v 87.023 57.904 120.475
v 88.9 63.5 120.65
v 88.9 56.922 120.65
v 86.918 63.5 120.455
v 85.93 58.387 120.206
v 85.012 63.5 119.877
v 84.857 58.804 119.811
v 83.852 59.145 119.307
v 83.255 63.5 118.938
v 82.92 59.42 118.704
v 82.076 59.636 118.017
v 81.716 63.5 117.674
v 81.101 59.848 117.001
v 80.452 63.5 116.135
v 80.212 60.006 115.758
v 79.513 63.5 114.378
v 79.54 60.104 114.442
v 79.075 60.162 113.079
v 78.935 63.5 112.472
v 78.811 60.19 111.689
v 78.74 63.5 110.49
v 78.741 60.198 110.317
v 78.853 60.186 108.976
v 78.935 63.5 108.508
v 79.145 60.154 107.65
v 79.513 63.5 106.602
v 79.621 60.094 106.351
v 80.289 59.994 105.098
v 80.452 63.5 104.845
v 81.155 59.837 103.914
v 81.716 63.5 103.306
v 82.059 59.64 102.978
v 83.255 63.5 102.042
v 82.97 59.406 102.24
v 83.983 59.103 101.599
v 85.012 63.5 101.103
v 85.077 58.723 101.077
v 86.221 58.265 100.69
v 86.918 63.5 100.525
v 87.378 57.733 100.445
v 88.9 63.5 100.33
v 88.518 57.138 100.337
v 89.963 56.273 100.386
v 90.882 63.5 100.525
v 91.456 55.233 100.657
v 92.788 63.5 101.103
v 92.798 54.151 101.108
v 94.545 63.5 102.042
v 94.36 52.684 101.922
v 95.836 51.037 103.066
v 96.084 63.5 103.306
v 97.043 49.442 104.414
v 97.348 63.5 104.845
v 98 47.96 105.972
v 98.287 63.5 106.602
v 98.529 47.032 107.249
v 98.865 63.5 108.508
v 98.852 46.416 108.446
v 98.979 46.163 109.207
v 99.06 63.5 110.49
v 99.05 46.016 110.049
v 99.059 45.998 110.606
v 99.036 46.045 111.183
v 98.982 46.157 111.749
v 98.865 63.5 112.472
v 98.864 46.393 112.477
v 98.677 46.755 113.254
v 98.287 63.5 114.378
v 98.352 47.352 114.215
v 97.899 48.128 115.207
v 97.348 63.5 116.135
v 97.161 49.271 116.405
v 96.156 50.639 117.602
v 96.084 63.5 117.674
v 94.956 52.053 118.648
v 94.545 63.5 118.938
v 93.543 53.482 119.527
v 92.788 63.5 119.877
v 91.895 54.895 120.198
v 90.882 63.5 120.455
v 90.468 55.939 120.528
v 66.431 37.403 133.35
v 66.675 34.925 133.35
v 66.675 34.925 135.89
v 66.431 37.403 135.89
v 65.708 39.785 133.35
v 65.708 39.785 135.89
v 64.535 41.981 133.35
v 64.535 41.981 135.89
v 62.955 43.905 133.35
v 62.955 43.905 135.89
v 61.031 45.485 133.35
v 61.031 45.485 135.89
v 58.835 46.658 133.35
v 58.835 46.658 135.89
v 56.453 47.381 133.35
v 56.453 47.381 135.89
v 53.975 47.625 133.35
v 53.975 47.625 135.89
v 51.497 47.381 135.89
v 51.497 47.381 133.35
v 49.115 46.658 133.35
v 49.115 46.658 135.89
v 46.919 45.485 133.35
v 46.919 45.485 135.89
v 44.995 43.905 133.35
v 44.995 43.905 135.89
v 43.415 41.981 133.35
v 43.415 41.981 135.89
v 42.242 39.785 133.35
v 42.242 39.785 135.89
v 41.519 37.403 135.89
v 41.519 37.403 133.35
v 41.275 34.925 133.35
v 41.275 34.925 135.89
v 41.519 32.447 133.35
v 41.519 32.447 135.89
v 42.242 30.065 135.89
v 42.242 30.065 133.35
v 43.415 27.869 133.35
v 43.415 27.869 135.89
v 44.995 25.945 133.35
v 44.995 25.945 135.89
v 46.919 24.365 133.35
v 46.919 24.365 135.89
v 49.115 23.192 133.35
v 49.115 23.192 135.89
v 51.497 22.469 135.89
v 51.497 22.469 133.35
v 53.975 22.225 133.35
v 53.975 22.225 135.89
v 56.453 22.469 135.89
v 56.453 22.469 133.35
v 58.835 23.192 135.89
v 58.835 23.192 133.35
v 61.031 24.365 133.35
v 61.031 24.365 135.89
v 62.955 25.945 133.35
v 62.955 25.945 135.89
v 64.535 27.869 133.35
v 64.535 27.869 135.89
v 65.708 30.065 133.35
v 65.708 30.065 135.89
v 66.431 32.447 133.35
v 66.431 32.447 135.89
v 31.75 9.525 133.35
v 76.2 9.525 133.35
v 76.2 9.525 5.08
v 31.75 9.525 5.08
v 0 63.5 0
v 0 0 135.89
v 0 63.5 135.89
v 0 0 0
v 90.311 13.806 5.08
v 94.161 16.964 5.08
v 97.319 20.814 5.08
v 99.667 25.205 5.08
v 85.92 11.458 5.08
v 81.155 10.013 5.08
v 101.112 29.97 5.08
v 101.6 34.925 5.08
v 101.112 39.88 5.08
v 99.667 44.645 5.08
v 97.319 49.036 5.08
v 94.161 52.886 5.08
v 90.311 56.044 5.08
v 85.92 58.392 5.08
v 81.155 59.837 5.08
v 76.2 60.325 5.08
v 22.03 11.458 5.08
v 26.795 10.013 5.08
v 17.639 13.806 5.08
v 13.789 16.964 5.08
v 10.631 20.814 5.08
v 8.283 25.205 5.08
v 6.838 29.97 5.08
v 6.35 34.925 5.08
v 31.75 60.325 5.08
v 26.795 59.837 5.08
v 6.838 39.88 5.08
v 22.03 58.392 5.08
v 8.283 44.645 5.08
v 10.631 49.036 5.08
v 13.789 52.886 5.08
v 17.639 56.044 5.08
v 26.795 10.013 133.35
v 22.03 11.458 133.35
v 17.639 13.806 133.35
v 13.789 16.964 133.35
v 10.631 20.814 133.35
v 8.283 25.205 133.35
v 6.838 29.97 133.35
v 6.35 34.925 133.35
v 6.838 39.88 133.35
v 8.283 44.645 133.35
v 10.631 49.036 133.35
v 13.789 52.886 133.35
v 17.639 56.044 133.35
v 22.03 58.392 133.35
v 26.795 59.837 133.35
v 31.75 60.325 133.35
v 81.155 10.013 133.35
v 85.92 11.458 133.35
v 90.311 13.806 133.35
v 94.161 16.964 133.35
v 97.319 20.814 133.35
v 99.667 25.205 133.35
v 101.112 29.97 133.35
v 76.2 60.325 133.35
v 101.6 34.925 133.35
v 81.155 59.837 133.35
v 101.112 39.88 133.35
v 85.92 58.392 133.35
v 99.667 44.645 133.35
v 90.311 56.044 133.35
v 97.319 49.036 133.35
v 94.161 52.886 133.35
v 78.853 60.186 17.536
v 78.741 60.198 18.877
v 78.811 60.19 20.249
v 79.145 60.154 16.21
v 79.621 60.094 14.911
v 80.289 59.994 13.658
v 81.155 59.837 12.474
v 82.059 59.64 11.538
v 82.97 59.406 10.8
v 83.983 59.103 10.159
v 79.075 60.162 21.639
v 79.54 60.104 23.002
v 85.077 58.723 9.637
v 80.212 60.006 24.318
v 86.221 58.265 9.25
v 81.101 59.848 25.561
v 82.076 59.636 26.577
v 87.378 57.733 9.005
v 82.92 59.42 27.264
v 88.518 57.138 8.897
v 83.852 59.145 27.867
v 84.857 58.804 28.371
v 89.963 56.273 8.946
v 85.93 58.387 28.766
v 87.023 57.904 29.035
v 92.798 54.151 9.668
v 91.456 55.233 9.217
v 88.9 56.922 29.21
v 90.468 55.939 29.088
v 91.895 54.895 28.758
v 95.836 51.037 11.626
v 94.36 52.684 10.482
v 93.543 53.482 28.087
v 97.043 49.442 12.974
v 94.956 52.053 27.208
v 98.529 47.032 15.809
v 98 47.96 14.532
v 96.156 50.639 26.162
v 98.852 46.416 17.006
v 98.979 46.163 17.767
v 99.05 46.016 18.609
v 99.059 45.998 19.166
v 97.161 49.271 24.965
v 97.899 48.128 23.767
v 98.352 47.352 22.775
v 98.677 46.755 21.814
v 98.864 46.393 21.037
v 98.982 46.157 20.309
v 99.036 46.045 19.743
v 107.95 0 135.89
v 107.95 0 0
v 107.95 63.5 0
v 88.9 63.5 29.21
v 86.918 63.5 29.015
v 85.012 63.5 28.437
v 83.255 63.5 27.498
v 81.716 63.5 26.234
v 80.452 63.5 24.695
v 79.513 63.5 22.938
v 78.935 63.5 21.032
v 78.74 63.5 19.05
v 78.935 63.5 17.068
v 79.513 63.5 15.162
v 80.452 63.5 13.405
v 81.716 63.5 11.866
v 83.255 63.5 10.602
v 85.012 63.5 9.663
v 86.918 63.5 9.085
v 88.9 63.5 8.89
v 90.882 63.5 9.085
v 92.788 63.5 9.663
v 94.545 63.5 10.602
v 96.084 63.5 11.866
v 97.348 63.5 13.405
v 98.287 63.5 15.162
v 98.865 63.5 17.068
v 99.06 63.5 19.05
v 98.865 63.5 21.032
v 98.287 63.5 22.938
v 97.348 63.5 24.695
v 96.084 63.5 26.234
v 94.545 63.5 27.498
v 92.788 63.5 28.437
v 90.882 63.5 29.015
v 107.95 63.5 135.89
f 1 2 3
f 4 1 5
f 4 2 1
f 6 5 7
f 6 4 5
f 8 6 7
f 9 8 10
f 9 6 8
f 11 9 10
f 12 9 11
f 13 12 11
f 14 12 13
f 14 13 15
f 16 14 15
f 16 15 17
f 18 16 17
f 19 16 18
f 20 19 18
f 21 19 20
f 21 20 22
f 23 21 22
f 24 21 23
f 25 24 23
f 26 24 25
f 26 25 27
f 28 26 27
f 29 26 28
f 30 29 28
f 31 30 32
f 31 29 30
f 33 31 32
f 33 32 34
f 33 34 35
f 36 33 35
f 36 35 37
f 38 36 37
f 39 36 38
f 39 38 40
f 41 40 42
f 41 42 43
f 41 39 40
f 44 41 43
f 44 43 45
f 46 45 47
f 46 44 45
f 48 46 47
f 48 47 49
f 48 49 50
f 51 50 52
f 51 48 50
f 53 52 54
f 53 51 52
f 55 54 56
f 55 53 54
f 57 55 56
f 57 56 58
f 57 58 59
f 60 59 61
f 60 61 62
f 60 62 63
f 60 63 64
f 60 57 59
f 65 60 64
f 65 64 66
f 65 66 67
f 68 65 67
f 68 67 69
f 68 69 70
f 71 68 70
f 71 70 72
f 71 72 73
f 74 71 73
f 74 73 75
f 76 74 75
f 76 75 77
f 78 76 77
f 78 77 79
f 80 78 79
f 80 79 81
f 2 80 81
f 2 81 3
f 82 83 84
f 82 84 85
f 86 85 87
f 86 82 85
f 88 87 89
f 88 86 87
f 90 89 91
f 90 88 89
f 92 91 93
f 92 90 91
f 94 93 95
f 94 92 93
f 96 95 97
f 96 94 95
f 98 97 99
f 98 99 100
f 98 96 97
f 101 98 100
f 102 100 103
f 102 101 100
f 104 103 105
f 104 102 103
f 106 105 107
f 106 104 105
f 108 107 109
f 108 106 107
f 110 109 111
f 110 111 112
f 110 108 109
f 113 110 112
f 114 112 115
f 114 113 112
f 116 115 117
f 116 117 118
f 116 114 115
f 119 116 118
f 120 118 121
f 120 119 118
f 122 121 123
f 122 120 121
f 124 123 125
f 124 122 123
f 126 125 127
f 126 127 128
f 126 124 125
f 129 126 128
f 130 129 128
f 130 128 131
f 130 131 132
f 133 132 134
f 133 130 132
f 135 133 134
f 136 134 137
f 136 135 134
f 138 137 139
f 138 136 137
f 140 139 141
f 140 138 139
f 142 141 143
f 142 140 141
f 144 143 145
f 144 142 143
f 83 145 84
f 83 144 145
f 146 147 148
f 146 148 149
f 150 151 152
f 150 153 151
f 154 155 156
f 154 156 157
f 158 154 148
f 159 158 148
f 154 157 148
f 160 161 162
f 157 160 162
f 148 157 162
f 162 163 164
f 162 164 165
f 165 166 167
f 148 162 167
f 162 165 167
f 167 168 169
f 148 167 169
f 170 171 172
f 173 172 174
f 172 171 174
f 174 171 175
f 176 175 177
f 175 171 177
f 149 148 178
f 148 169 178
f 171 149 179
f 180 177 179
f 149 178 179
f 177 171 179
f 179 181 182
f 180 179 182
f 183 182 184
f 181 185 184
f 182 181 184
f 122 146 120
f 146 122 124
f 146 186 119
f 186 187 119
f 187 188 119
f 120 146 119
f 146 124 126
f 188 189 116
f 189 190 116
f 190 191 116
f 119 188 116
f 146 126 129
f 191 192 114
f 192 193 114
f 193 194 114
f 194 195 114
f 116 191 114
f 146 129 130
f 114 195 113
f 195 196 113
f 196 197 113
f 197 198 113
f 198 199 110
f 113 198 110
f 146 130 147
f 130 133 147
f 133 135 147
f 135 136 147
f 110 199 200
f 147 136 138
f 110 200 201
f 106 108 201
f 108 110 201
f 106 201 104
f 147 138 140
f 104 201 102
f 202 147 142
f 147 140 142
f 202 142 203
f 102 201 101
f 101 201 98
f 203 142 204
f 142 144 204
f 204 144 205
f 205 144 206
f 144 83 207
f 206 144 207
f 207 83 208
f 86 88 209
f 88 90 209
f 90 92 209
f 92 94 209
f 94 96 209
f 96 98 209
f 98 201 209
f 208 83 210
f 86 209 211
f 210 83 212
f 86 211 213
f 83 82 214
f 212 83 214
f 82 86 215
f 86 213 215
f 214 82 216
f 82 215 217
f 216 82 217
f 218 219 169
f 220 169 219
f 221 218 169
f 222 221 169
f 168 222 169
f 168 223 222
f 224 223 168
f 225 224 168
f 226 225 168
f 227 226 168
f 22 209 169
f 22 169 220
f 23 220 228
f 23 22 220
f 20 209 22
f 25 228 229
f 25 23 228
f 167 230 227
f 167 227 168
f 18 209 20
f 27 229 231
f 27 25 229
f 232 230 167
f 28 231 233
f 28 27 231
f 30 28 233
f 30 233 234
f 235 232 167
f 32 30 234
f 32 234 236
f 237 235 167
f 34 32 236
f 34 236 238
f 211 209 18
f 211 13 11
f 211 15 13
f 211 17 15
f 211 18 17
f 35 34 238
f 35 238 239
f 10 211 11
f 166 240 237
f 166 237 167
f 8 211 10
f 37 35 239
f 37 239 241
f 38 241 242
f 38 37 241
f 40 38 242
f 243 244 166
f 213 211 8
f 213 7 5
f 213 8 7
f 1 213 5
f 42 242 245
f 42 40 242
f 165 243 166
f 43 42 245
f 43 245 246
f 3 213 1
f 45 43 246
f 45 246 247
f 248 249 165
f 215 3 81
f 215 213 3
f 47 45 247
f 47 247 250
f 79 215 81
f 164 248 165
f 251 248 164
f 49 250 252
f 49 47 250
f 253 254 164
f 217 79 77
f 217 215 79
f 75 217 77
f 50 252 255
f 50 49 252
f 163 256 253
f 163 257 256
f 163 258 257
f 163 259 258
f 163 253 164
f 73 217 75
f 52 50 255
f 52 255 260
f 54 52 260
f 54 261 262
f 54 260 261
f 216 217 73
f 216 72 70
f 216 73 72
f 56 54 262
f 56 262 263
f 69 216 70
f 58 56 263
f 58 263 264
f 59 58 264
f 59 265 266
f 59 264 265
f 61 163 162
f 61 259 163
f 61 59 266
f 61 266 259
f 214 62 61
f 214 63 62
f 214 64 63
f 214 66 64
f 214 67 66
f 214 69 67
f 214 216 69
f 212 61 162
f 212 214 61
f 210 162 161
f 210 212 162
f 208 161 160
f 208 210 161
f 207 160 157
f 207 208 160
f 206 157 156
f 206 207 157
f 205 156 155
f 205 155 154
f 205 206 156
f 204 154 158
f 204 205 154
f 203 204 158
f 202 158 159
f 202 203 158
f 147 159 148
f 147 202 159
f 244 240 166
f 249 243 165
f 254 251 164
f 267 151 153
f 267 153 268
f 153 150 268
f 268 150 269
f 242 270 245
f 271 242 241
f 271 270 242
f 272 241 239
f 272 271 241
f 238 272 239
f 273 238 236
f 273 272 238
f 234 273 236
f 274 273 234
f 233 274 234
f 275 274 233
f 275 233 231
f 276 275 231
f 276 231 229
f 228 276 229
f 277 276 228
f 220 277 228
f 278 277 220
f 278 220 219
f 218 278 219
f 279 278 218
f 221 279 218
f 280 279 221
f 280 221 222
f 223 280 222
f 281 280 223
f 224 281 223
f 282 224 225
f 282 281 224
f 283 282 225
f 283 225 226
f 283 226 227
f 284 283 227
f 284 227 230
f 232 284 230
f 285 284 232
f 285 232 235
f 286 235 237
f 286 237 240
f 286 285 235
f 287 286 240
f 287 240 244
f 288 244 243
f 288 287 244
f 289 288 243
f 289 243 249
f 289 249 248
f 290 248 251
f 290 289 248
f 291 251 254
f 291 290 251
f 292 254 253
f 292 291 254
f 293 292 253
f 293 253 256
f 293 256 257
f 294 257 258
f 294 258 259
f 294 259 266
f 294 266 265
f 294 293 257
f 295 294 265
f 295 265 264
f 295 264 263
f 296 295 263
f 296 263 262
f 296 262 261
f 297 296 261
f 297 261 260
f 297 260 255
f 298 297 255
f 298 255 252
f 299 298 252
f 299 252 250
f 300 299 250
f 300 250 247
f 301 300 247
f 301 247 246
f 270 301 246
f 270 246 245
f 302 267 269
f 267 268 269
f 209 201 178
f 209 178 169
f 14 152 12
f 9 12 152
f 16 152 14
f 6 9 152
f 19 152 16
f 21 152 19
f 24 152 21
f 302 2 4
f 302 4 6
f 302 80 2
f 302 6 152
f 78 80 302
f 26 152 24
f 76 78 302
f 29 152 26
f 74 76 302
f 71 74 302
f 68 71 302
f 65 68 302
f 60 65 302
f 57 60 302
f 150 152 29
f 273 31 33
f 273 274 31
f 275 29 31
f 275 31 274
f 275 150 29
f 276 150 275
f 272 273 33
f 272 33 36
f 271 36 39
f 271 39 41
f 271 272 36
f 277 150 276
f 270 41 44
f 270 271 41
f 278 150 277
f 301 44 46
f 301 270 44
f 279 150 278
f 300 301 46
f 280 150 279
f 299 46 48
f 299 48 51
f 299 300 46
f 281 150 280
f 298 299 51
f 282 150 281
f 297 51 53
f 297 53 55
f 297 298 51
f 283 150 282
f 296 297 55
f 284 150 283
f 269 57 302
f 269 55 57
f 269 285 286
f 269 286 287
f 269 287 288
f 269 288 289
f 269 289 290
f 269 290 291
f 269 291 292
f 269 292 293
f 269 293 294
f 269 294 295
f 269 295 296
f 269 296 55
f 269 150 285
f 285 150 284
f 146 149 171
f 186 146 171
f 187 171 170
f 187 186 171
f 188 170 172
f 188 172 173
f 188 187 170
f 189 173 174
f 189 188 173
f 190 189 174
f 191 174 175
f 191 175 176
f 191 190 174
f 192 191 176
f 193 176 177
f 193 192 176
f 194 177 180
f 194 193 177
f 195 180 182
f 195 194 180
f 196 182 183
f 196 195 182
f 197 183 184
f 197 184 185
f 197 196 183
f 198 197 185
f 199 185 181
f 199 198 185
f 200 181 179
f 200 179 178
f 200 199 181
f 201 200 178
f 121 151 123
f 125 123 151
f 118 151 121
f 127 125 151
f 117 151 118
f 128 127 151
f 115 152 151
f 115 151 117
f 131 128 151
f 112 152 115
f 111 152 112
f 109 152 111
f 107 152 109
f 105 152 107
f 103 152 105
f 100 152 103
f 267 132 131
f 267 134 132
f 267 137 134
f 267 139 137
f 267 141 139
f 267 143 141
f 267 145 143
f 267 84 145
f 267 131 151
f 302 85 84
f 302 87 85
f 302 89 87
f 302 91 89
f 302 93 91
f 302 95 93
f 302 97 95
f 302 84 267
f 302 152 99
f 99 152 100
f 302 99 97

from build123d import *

# Parameters (mm, degrees)
SKETCH1_W               = 107.95
SKETCH1_H               = 63.5
BOSS_EXTRUDE5_DEPTH     = 133.35
SKETCH5_OUTSIDE_W       = 146.538
SKETCH5_OUTSIDE_H       = 102.088
SKETCH5_OUTSIDE_W_2     = 107.95
SKETCH5_OUTSIDE_H_2     = 63.5
CUT_EXTRUDE4_DEPTH      = 128.27
SKETCH6_W               = 107.95
SKETCH6_H               = 63.5
SKETCH6_R               = 12.7
BOSS_EXTRUDE6_DEPTH     = 2.54
CUT_EXTRUDE6_REACH      = 186.801
CUT_EXTRUDE6_END_RADIUS = 25.4
SKETCH8_R               = 10.16


with BuildPart() as part:
    # Sketch1 → Boss-Extrude5 (new body)
    with BuildSketch(Plane.XY):
        with Locations((53.975, 31.75)):
            Rectangle(SKETCH1_W, SKETCH1_H)
    extrude(amount=BOSS_EXTRUDE5_DEPTH)

    # Sketch5 outside → Cut-Extrude4 (cut)
    # profile 1 of 2: a face of its own
    with BuildSketch(Plane.XY.offset(133.35)):
        with Locations((53.975, 31.75)):
            Rectangle(SKETCH5_OUTSIDE_W, SKETCH5_OUTSIDE_H)
        with Locations((53.975, 31.75)):
            Rectangle(SKETCH5_OUTSIDE_W_2, SKETCH5_OUTSIDE_H_2, mode=Mode.SUBTRACT)
    # profile 2 of 2: a face of its own
    with BuildSketch(Plane.XY.offset(133.35)):
        with BuildLine():
            Line((31.75, 60.325), (76.2, 60.325))
            ThreePointArc((76.2, 60.325), (101.6, 34.925), (76.2, 9.525))
            Line((76.2, 9.525), (31.75, 9.525))
            ThreePointArc((31.75, 9.525), (6.35, 34.925), (31.75, 60.325))
        make_face()
    extrude(amount=-CUT_EXTRUDE4_DEPTH, mode=Mode.SUBTRACT)

    # Sketch6 → Boss-Extrude6 (add)
    with BuildSketch(Plane.XY.offset(133.35)):
        with Locations((53.975, 31.75)):
            Rectangle(SKETCH6_W, SKETCH6_H)
        with Locations((53.975, 34.925)):
            Circle(SKETCH6_R, mode=Mode.SUBTRACT)
    extrude(amount=BOSS_EXTRUDE6_DEPTH)

    # Cut-Extrude6: up to this cylinder (the profile starts outside it)
    cut_extrude6_end = Plane(origin=(76.2, 34.925, 64.77), z_dir=(0, 0, 1)) * Cylinder(CUT_EXTRUDE6_END_RADIUS, 516.842, mode=Mode.PRIVATE)
    # Sketch8 → Cut-Extrude6 (cut, up to the surface)
    with BuildSketch(Plane.XZ.offset(-63.5), mode=Mode.PRIVATE) as cut_extrude6_sk1:
        with Locations(Location((88.9, 19.05, 0), (0, 0, 90))):
            Circle(SKETCH8_R)
    cut_extrude6_tool1 = extrude(cut_extrude6_sk1.sketch, amount=CUT_EXTRUDE6_REACH, mode=Mode.PRIVATE) - cut_extrude6_end
    add(cut_extrude6_tool1.solids().sort_by_distance((88.9, 63.5, 19.05))[0], mode=Mode.SUBTRACT)
    # Sketch8 → Cut-Extrude6 (cut, up to the surface)
    with BuildSketch(Plane.XZ.offset(-63.5), mode=Mode.PRIVATE) as cut_extrude6_sk2:
        with Locations(Location((88.9, 110.49, 0), (0, 0, 90))):
            Circle(SKETCH8_R)
    cut_extrude6_tool2 = extrude(cut_extrude6_sk2.sketch, amount=CUT_EXTRUDE6_REACH, mode=Mode.PRIVATE) - cut_extrude6_end
    add(cut_extrude6_tool2.solids().sort_by_distance((88.9, 63.5, 110.49))[0], mode=Mode.SUBTRACT)


solid = part.part
